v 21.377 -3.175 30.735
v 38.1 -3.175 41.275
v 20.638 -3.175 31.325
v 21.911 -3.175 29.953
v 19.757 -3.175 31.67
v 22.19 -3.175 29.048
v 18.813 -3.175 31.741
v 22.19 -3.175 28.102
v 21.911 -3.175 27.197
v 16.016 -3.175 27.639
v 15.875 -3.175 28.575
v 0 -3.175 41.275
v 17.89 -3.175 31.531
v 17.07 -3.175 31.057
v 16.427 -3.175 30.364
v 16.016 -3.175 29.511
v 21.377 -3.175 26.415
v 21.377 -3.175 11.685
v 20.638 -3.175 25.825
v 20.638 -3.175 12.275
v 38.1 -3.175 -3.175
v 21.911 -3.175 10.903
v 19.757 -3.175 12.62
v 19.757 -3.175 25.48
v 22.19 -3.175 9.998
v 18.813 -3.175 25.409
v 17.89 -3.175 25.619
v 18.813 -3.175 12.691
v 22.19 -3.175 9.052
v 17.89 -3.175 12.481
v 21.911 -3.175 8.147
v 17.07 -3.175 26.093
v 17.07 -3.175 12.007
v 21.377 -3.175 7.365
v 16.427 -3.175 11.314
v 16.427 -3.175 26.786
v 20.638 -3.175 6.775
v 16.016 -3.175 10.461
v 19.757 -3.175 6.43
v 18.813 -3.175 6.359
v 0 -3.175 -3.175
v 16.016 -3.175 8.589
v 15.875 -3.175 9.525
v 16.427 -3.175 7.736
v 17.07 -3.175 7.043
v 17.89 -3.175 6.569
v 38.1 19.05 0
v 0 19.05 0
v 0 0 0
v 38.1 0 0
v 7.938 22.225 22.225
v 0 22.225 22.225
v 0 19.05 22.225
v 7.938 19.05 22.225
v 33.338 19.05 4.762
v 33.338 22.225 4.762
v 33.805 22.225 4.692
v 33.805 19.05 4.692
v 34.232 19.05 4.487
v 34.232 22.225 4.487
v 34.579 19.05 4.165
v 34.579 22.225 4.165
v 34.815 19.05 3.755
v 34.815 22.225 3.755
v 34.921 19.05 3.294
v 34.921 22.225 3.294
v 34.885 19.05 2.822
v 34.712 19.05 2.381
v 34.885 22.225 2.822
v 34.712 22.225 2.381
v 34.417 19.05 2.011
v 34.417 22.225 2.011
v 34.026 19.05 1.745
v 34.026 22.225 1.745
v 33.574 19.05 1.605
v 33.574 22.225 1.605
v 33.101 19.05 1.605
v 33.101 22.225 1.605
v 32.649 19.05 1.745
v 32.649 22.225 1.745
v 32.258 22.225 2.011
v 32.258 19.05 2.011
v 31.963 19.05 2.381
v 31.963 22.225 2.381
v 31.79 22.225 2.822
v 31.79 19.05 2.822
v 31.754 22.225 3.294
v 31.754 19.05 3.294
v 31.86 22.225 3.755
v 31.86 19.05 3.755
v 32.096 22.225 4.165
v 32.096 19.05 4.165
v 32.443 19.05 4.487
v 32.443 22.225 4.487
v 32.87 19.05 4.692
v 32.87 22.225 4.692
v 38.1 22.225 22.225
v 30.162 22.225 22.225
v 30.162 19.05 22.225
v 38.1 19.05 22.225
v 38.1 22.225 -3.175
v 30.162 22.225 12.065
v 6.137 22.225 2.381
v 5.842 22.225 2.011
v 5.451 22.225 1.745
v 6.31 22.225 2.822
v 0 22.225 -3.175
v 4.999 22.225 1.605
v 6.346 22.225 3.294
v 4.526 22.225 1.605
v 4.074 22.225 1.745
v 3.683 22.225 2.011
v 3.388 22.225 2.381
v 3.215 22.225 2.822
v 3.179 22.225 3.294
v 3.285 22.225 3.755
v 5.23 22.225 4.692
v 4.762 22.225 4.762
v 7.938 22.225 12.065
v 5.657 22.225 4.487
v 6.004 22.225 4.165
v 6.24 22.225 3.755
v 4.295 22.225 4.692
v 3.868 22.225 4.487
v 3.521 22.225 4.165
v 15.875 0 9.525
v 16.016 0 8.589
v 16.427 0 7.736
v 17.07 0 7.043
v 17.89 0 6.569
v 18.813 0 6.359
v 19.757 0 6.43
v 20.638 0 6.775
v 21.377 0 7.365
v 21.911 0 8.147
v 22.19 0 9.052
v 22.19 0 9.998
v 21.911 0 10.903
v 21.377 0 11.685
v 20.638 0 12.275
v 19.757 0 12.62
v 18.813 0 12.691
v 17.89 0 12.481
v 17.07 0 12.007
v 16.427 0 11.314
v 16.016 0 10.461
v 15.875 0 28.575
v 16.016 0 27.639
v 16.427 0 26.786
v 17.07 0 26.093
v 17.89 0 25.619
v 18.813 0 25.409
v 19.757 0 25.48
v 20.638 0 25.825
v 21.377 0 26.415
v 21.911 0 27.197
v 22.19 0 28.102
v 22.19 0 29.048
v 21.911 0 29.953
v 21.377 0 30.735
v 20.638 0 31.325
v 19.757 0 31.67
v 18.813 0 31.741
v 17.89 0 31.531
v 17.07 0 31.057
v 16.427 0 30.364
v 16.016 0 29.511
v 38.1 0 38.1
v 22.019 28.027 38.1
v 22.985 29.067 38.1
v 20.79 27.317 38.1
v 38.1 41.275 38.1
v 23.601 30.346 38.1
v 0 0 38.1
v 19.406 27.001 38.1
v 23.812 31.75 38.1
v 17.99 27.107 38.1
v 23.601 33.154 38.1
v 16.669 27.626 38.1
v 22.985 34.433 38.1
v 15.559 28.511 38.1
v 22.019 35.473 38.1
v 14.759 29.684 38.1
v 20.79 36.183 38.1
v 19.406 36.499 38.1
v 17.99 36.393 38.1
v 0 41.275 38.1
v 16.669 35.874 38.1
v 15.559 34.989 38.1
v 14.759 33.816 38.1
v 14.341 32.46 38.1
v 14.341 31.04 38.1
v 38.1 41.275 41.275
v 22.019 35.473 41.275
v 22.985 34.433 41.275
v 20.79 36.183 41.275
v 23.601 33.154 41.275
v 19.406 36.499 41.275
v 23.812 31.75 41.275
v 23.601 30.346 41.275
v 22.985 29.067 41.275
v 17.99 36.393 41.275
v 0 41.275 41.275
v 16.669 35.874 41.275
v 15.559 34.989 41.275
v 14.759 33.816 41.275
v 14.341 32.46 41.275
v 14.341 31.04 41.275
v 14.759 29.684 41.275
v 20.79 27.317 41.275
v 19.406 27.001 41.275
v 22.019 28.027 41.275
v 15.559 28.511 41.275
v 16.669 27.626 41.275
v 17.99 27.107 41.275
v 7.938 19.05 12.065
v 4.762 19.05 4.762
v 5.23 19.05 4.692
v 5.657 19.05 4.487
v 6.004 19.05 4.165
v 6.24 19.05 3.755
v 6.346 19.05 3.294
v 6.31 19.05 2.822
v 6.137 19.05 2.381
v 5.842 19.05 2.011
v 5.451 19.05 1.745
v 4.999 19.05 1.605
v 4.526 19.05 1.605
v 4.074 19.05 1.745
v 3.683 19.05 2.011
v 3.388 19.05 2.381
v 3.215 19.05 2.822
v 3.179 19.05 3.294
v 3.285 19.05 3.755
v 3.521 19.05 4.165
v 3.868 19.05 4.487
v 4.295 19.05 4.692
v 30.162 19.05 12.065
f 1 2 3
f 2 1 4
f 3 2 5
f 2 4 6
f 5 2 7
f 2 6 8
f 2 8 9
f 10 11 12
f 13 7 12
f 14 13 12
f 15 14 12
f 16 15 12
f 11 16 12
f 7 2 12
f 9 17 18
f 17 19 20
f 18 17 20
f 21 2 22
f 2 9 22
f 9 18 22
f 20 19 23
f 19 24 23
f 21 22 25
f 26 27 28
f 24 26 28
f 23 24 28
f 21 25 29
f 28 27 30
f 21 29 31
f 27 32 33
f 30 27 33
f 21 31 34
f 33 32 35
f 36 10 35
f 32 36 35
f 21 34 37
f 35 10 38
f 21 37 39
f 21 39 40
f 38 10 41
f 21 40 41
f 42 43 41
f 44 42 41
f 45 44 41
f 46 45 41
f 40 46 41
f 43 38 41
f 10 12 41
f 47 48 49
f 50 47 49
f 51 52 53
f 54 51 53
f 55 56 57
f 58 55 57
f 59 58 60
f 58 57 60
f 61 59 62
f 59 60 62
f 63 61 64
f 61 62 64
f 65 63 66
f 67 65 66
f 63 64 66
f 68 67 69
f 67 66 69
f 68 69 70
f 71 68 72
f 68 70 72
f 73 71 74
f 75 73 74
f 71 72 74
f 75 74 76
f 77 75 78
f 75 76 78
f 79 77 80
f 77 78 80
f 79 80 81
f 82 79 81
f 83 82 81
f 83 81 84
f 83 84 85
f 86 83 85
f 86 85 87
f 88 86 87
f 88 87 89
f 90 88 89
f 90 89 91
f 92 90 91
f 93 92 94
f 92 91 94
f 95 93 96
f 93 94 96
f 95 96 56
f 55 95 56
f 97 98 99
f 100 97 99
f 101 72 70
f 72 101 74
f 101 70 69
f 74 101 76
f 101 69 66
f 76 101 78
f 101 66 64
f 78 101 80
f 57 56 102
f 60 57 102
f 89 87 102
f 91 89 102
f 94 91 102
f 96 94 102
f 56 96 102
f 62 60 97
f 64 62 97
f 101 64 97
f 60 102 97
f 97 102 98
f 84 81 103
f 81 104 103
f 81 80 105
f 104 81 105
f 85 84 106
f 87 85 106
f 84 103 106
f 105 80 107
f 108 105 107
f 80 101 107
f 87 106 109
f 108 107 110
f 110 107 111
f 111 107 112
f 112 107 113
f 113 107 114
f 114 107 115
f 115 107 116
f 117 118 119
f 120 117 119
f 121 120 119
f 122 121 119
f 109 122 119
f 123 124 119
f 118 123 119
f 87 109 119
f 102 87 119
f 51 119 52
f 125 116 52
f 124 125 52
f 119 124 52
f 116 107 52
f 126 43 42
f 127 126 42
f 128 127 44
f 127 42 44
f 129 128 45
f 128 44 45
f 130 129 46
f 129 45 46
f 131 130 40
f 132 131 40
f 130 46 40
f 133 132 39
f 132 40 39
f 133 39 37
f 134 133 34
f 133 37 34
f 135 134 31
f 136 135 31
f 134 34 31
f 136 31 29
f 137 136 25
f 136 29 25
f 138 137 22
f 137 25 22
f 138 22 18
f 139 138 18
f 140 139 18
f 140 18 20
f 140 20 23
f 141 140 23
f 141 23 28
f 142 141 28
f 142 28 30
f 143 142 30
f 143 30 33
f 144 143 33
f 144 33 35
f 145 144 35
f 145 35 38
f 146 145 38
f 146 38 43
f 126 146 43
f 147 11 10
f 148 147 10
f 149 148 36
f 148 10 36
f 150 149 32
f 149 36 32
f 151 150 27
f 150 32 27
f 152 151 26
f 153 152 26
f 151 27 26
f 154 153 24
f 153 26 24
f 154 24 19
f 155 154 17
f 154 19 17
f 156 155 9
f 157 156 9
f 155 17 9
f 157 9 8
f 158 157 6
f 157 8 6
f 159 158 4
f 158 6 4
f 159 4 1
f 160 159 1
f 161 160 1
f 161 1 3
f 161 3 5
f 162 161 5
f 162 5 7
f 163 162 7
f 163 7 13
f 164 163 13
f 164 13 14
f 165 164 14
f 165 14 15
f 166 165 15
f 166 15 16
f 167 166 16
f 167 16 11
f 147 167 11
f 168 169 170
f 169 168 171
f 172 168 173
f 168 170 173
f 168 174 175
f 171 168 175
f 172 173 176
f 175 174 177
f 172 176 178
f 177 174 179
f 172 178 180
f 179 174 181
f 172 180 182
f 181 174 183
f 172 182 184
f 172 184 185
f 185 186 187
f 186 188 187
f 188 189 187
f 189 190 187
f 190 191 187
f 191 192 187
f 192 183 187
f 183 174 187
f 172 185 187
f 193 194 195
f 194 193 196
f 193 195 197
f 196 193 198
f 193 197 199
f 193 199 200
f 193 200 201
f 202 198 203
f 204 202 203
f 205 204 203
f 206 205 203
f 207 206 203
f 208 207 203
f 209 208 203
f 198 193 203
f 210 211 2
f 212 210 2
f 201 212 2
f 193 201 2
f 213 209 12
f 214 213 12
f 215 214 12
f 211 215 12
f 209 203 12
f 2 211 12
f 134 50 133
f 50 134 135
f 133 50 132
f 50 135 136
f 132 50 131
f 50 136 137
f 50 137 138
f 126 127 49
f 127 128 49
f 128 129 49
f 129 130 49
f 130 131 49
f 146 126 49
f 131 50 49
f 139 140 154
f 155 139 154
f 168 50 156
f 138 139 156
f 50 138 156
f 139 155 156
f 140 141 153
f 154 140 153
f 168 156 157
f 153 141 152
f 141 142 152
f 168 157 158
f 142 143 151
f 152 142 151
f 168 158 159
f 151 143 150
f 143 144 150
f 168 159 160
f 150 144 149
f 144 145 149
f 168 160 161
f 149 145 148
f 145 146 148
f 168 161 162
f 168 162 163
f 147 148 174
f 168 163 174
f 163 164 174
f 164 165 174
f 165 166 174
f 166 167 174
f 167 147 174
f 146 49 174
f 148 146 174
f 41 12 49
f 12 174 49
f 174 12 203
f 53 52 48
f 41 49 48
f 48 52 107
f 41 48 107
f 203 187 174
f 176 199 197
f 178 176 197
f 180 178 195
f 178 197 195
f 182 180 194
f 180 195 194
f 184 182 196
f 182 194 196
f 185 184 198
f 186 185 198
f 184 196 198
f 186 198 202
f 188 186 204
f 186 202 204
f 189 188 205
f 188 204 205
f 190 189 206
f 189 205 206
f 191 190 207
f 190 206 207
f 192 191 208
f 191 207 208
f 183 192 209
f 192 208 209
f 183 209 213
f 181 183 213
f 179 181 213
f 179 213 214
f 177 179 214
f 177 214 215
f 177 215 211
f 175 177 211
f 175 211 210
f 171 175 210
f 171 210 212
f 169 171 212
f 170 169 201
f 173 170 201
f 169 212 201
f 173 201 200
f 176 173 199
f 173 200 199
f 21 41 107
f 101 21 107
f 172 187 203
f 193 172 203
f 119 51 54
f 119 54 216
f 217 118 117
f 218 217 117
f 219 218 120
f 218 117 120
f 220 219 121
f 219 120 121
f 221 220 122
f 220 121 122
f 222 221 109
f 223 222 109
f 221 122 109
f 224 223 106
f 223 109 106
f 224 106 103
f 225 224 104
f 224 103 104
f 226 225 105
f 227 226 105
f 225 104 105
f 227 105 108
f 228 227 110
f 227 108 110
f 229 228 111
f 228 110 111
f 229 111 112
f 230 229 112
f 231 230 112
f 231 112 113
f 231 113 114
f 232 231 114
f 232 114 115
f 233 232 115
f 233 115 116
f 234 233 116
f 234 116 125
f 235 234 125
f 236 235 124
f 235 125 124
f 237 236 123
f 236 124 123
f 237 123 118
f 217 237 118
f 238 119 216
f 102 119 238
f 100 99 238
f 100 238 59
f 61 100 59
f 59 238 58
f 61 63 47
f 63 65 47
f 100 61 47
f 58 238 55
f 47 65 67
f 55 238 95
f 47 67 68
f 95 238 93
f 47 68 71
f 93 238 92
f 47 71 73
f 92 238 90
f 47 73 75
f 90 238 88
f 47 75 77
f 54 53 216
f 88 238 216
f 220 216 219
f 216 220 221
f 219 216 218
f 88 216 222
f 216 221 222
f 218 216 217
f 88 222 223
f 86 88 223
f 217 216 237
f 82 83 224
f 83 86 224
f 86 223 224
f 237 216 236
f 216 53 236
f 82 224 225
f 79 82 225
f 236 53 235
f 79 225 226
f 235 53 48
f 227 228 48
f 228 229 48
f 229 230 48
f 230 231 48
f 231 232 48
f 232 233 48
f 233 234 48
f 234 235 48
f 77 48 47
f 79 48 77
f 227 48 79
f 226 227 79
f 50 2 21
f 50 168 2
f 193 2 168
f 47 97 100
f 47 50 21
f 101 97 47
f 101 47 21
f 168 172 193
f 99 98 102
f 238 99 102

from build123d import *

# Parameters (mm, degrees)
BOSS_EXTRUDE1_DEPTH              = 38.1
SKETCH2_W                        = 22.225
SKETCH2_H                        = 10.16
CUT_EXTRUDE1_DEPTH               = 3.175
SKETCH6_R                        = 1.5875
CUT_EXTRUDE2_DEPTH               = 3.175
SKETCH7_R                        = 4.7625
CUT_EXTRUDE3_DEPTH               = 3.175
F_1_4_0_25_DIAMETER_HOLE1_REACH  = 73.631
F_1_4_0_25_DIAMETER_HOLE1_BORE_R = 3.175


with BuildPart() as part:
    # Sketch1 → Boss-Extrude1 (new body)
    with BuildSketch(Plane(origin=(0, 0, 0), x_dir=(0, 0, -1), z_dir=(1, 0, 0))):
        Polygon((0, 0), (-38.1, 0), (-38.1, 41.275), (-41.275, 41.275), (-41.275, -3.175), (3.175, -3.175), (3.175, 22.225), (-22.225, 22.225), (-22.225, 19.05), (0, 19.05), align=None)
    extrude(amount=BOSS_EXTRUDE1_DEPTH)

    # Sketch2 → Cut-Extrude1 (cut)
    with BuildSketch(Plane(origin=(0, 22.225, 0), x_dir=(1, 0, 0), z_dir=(0, 1, 0))):
        with Locations((19.05, -17.145)):
            Rectangle(SKETCH2_W, SKETCH2_H)
    extrude(amount=-CUT_EXTRUDE1_DEPTH, mode=Mode.SUBTRACT)

    # Sketch6 → Cut-Extrude2 (cut)
    with BuildSketch(Plane(origin=(0, 22.225, 0), x_dir=(1, 0, 0), z_dir=(0, 1, 0))):
        with Locations(Location((33.3375, -3.175, 0), (0, 0, 270))):
            Circle(SKETCH6_R)
        with Locations(Location((4.7625, -3.175, 0), (0, 0, 270))):
            Circle(SKETCH6_R)
    extrude(amount=-CUT_EXTRUDE2_DEPTH, mode=Mode.SUBTRACT)

    # Sketch7 → Cut-Extrude3 (cut)
    with BuildSketch(Plane.XY.offset(41.275)):
        with Locations((19.05, 31.75)):
            Circle(SKETCH7_R)
    extrude(amount=-CUT_EXTRUDE3_DEPTH, mode=Mode.SUBTRACT)

    # 1/4 (0.25) Diameter Hole1 bore → 1/4 (0.25) Diameter Hole1 (cut, up to next)
    with BuildSketch(Plane(origin=(0, -3.175, 0), x_dir=(-1, 0, 0), z_dir=(0, -1, 0)), mode=Mode.PRIVATE) as f_1_4_0_25_diameter_hole1_sk1:
        with Locations((-19.05, -28.575)):
            Circle(F_1_4_0_25_DIAMETER_HOLE1_BORE_R)
    f_1_4_0_25_diameter_hole1_tool1 = extrude(f_1_4_0_25_diameter_hole1_sk1.sketch, amount=-F_1_4_0_25_DIAMETER_HOLE1_REACH, mode=Mode.PRIVATE) & part.part
    # 1/4 (0.25) Diameter Hole1 bore → 1/4 (0.25) Diameter Hole1 (cut, up to next)
    with BuildSketch(Plane(origin=(0, -3.175, 0), x_dir=(-1, 0, 0), z_dir=(0, -1, 0)), mode=Mode.PRIVATE) as f_1_4_0_25_diameter_hole1_sk2:
        with Locations((-19.05, -9.525)):
            Circle(F_1_4_0_25_DIAMETER_HOLE1_BORE_R)
    f_1_4_0_25_diameter_hole1_tool2 = extrude(f_1_4_0_25_diameter_hole1_sk2.sketch, amount=-F_1_4_0_25_DIAMETER_HOLE1_REACH, mode=Mode.PRIVATE) & part.part
    add(f_1_4_0_25_diameter_hole1_tool1.solids().sort_by_distance((19.05, -3.175, 28.575))[0], mode=Mode.SUBTRACT)
    add(f_1_4_0_25_diameter_hole1_tool2.solids().sort_by_distance((19.05, -3.175, 9.525))[0], mode=Mode.SUBTRACT)


solid = part.part
